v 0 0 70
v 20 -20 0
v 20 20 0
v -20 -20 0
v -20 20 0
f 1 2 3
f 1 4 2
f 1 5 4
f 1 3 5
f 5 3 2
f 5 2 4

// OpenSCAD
polyhedron(
  points=[ [20,20,0],[20,-20,0],[-20,-20,0],[-20,20,0], // the four points at base
           [0,0,70]  ],                                 // the apex point 
  faces=[ [0,1,4],[1,2,4],[2,3,4],[3,0,4],              // each triangle side
              [1,0,3],[2,1,3] ]                         // two triangles for square base
 );
